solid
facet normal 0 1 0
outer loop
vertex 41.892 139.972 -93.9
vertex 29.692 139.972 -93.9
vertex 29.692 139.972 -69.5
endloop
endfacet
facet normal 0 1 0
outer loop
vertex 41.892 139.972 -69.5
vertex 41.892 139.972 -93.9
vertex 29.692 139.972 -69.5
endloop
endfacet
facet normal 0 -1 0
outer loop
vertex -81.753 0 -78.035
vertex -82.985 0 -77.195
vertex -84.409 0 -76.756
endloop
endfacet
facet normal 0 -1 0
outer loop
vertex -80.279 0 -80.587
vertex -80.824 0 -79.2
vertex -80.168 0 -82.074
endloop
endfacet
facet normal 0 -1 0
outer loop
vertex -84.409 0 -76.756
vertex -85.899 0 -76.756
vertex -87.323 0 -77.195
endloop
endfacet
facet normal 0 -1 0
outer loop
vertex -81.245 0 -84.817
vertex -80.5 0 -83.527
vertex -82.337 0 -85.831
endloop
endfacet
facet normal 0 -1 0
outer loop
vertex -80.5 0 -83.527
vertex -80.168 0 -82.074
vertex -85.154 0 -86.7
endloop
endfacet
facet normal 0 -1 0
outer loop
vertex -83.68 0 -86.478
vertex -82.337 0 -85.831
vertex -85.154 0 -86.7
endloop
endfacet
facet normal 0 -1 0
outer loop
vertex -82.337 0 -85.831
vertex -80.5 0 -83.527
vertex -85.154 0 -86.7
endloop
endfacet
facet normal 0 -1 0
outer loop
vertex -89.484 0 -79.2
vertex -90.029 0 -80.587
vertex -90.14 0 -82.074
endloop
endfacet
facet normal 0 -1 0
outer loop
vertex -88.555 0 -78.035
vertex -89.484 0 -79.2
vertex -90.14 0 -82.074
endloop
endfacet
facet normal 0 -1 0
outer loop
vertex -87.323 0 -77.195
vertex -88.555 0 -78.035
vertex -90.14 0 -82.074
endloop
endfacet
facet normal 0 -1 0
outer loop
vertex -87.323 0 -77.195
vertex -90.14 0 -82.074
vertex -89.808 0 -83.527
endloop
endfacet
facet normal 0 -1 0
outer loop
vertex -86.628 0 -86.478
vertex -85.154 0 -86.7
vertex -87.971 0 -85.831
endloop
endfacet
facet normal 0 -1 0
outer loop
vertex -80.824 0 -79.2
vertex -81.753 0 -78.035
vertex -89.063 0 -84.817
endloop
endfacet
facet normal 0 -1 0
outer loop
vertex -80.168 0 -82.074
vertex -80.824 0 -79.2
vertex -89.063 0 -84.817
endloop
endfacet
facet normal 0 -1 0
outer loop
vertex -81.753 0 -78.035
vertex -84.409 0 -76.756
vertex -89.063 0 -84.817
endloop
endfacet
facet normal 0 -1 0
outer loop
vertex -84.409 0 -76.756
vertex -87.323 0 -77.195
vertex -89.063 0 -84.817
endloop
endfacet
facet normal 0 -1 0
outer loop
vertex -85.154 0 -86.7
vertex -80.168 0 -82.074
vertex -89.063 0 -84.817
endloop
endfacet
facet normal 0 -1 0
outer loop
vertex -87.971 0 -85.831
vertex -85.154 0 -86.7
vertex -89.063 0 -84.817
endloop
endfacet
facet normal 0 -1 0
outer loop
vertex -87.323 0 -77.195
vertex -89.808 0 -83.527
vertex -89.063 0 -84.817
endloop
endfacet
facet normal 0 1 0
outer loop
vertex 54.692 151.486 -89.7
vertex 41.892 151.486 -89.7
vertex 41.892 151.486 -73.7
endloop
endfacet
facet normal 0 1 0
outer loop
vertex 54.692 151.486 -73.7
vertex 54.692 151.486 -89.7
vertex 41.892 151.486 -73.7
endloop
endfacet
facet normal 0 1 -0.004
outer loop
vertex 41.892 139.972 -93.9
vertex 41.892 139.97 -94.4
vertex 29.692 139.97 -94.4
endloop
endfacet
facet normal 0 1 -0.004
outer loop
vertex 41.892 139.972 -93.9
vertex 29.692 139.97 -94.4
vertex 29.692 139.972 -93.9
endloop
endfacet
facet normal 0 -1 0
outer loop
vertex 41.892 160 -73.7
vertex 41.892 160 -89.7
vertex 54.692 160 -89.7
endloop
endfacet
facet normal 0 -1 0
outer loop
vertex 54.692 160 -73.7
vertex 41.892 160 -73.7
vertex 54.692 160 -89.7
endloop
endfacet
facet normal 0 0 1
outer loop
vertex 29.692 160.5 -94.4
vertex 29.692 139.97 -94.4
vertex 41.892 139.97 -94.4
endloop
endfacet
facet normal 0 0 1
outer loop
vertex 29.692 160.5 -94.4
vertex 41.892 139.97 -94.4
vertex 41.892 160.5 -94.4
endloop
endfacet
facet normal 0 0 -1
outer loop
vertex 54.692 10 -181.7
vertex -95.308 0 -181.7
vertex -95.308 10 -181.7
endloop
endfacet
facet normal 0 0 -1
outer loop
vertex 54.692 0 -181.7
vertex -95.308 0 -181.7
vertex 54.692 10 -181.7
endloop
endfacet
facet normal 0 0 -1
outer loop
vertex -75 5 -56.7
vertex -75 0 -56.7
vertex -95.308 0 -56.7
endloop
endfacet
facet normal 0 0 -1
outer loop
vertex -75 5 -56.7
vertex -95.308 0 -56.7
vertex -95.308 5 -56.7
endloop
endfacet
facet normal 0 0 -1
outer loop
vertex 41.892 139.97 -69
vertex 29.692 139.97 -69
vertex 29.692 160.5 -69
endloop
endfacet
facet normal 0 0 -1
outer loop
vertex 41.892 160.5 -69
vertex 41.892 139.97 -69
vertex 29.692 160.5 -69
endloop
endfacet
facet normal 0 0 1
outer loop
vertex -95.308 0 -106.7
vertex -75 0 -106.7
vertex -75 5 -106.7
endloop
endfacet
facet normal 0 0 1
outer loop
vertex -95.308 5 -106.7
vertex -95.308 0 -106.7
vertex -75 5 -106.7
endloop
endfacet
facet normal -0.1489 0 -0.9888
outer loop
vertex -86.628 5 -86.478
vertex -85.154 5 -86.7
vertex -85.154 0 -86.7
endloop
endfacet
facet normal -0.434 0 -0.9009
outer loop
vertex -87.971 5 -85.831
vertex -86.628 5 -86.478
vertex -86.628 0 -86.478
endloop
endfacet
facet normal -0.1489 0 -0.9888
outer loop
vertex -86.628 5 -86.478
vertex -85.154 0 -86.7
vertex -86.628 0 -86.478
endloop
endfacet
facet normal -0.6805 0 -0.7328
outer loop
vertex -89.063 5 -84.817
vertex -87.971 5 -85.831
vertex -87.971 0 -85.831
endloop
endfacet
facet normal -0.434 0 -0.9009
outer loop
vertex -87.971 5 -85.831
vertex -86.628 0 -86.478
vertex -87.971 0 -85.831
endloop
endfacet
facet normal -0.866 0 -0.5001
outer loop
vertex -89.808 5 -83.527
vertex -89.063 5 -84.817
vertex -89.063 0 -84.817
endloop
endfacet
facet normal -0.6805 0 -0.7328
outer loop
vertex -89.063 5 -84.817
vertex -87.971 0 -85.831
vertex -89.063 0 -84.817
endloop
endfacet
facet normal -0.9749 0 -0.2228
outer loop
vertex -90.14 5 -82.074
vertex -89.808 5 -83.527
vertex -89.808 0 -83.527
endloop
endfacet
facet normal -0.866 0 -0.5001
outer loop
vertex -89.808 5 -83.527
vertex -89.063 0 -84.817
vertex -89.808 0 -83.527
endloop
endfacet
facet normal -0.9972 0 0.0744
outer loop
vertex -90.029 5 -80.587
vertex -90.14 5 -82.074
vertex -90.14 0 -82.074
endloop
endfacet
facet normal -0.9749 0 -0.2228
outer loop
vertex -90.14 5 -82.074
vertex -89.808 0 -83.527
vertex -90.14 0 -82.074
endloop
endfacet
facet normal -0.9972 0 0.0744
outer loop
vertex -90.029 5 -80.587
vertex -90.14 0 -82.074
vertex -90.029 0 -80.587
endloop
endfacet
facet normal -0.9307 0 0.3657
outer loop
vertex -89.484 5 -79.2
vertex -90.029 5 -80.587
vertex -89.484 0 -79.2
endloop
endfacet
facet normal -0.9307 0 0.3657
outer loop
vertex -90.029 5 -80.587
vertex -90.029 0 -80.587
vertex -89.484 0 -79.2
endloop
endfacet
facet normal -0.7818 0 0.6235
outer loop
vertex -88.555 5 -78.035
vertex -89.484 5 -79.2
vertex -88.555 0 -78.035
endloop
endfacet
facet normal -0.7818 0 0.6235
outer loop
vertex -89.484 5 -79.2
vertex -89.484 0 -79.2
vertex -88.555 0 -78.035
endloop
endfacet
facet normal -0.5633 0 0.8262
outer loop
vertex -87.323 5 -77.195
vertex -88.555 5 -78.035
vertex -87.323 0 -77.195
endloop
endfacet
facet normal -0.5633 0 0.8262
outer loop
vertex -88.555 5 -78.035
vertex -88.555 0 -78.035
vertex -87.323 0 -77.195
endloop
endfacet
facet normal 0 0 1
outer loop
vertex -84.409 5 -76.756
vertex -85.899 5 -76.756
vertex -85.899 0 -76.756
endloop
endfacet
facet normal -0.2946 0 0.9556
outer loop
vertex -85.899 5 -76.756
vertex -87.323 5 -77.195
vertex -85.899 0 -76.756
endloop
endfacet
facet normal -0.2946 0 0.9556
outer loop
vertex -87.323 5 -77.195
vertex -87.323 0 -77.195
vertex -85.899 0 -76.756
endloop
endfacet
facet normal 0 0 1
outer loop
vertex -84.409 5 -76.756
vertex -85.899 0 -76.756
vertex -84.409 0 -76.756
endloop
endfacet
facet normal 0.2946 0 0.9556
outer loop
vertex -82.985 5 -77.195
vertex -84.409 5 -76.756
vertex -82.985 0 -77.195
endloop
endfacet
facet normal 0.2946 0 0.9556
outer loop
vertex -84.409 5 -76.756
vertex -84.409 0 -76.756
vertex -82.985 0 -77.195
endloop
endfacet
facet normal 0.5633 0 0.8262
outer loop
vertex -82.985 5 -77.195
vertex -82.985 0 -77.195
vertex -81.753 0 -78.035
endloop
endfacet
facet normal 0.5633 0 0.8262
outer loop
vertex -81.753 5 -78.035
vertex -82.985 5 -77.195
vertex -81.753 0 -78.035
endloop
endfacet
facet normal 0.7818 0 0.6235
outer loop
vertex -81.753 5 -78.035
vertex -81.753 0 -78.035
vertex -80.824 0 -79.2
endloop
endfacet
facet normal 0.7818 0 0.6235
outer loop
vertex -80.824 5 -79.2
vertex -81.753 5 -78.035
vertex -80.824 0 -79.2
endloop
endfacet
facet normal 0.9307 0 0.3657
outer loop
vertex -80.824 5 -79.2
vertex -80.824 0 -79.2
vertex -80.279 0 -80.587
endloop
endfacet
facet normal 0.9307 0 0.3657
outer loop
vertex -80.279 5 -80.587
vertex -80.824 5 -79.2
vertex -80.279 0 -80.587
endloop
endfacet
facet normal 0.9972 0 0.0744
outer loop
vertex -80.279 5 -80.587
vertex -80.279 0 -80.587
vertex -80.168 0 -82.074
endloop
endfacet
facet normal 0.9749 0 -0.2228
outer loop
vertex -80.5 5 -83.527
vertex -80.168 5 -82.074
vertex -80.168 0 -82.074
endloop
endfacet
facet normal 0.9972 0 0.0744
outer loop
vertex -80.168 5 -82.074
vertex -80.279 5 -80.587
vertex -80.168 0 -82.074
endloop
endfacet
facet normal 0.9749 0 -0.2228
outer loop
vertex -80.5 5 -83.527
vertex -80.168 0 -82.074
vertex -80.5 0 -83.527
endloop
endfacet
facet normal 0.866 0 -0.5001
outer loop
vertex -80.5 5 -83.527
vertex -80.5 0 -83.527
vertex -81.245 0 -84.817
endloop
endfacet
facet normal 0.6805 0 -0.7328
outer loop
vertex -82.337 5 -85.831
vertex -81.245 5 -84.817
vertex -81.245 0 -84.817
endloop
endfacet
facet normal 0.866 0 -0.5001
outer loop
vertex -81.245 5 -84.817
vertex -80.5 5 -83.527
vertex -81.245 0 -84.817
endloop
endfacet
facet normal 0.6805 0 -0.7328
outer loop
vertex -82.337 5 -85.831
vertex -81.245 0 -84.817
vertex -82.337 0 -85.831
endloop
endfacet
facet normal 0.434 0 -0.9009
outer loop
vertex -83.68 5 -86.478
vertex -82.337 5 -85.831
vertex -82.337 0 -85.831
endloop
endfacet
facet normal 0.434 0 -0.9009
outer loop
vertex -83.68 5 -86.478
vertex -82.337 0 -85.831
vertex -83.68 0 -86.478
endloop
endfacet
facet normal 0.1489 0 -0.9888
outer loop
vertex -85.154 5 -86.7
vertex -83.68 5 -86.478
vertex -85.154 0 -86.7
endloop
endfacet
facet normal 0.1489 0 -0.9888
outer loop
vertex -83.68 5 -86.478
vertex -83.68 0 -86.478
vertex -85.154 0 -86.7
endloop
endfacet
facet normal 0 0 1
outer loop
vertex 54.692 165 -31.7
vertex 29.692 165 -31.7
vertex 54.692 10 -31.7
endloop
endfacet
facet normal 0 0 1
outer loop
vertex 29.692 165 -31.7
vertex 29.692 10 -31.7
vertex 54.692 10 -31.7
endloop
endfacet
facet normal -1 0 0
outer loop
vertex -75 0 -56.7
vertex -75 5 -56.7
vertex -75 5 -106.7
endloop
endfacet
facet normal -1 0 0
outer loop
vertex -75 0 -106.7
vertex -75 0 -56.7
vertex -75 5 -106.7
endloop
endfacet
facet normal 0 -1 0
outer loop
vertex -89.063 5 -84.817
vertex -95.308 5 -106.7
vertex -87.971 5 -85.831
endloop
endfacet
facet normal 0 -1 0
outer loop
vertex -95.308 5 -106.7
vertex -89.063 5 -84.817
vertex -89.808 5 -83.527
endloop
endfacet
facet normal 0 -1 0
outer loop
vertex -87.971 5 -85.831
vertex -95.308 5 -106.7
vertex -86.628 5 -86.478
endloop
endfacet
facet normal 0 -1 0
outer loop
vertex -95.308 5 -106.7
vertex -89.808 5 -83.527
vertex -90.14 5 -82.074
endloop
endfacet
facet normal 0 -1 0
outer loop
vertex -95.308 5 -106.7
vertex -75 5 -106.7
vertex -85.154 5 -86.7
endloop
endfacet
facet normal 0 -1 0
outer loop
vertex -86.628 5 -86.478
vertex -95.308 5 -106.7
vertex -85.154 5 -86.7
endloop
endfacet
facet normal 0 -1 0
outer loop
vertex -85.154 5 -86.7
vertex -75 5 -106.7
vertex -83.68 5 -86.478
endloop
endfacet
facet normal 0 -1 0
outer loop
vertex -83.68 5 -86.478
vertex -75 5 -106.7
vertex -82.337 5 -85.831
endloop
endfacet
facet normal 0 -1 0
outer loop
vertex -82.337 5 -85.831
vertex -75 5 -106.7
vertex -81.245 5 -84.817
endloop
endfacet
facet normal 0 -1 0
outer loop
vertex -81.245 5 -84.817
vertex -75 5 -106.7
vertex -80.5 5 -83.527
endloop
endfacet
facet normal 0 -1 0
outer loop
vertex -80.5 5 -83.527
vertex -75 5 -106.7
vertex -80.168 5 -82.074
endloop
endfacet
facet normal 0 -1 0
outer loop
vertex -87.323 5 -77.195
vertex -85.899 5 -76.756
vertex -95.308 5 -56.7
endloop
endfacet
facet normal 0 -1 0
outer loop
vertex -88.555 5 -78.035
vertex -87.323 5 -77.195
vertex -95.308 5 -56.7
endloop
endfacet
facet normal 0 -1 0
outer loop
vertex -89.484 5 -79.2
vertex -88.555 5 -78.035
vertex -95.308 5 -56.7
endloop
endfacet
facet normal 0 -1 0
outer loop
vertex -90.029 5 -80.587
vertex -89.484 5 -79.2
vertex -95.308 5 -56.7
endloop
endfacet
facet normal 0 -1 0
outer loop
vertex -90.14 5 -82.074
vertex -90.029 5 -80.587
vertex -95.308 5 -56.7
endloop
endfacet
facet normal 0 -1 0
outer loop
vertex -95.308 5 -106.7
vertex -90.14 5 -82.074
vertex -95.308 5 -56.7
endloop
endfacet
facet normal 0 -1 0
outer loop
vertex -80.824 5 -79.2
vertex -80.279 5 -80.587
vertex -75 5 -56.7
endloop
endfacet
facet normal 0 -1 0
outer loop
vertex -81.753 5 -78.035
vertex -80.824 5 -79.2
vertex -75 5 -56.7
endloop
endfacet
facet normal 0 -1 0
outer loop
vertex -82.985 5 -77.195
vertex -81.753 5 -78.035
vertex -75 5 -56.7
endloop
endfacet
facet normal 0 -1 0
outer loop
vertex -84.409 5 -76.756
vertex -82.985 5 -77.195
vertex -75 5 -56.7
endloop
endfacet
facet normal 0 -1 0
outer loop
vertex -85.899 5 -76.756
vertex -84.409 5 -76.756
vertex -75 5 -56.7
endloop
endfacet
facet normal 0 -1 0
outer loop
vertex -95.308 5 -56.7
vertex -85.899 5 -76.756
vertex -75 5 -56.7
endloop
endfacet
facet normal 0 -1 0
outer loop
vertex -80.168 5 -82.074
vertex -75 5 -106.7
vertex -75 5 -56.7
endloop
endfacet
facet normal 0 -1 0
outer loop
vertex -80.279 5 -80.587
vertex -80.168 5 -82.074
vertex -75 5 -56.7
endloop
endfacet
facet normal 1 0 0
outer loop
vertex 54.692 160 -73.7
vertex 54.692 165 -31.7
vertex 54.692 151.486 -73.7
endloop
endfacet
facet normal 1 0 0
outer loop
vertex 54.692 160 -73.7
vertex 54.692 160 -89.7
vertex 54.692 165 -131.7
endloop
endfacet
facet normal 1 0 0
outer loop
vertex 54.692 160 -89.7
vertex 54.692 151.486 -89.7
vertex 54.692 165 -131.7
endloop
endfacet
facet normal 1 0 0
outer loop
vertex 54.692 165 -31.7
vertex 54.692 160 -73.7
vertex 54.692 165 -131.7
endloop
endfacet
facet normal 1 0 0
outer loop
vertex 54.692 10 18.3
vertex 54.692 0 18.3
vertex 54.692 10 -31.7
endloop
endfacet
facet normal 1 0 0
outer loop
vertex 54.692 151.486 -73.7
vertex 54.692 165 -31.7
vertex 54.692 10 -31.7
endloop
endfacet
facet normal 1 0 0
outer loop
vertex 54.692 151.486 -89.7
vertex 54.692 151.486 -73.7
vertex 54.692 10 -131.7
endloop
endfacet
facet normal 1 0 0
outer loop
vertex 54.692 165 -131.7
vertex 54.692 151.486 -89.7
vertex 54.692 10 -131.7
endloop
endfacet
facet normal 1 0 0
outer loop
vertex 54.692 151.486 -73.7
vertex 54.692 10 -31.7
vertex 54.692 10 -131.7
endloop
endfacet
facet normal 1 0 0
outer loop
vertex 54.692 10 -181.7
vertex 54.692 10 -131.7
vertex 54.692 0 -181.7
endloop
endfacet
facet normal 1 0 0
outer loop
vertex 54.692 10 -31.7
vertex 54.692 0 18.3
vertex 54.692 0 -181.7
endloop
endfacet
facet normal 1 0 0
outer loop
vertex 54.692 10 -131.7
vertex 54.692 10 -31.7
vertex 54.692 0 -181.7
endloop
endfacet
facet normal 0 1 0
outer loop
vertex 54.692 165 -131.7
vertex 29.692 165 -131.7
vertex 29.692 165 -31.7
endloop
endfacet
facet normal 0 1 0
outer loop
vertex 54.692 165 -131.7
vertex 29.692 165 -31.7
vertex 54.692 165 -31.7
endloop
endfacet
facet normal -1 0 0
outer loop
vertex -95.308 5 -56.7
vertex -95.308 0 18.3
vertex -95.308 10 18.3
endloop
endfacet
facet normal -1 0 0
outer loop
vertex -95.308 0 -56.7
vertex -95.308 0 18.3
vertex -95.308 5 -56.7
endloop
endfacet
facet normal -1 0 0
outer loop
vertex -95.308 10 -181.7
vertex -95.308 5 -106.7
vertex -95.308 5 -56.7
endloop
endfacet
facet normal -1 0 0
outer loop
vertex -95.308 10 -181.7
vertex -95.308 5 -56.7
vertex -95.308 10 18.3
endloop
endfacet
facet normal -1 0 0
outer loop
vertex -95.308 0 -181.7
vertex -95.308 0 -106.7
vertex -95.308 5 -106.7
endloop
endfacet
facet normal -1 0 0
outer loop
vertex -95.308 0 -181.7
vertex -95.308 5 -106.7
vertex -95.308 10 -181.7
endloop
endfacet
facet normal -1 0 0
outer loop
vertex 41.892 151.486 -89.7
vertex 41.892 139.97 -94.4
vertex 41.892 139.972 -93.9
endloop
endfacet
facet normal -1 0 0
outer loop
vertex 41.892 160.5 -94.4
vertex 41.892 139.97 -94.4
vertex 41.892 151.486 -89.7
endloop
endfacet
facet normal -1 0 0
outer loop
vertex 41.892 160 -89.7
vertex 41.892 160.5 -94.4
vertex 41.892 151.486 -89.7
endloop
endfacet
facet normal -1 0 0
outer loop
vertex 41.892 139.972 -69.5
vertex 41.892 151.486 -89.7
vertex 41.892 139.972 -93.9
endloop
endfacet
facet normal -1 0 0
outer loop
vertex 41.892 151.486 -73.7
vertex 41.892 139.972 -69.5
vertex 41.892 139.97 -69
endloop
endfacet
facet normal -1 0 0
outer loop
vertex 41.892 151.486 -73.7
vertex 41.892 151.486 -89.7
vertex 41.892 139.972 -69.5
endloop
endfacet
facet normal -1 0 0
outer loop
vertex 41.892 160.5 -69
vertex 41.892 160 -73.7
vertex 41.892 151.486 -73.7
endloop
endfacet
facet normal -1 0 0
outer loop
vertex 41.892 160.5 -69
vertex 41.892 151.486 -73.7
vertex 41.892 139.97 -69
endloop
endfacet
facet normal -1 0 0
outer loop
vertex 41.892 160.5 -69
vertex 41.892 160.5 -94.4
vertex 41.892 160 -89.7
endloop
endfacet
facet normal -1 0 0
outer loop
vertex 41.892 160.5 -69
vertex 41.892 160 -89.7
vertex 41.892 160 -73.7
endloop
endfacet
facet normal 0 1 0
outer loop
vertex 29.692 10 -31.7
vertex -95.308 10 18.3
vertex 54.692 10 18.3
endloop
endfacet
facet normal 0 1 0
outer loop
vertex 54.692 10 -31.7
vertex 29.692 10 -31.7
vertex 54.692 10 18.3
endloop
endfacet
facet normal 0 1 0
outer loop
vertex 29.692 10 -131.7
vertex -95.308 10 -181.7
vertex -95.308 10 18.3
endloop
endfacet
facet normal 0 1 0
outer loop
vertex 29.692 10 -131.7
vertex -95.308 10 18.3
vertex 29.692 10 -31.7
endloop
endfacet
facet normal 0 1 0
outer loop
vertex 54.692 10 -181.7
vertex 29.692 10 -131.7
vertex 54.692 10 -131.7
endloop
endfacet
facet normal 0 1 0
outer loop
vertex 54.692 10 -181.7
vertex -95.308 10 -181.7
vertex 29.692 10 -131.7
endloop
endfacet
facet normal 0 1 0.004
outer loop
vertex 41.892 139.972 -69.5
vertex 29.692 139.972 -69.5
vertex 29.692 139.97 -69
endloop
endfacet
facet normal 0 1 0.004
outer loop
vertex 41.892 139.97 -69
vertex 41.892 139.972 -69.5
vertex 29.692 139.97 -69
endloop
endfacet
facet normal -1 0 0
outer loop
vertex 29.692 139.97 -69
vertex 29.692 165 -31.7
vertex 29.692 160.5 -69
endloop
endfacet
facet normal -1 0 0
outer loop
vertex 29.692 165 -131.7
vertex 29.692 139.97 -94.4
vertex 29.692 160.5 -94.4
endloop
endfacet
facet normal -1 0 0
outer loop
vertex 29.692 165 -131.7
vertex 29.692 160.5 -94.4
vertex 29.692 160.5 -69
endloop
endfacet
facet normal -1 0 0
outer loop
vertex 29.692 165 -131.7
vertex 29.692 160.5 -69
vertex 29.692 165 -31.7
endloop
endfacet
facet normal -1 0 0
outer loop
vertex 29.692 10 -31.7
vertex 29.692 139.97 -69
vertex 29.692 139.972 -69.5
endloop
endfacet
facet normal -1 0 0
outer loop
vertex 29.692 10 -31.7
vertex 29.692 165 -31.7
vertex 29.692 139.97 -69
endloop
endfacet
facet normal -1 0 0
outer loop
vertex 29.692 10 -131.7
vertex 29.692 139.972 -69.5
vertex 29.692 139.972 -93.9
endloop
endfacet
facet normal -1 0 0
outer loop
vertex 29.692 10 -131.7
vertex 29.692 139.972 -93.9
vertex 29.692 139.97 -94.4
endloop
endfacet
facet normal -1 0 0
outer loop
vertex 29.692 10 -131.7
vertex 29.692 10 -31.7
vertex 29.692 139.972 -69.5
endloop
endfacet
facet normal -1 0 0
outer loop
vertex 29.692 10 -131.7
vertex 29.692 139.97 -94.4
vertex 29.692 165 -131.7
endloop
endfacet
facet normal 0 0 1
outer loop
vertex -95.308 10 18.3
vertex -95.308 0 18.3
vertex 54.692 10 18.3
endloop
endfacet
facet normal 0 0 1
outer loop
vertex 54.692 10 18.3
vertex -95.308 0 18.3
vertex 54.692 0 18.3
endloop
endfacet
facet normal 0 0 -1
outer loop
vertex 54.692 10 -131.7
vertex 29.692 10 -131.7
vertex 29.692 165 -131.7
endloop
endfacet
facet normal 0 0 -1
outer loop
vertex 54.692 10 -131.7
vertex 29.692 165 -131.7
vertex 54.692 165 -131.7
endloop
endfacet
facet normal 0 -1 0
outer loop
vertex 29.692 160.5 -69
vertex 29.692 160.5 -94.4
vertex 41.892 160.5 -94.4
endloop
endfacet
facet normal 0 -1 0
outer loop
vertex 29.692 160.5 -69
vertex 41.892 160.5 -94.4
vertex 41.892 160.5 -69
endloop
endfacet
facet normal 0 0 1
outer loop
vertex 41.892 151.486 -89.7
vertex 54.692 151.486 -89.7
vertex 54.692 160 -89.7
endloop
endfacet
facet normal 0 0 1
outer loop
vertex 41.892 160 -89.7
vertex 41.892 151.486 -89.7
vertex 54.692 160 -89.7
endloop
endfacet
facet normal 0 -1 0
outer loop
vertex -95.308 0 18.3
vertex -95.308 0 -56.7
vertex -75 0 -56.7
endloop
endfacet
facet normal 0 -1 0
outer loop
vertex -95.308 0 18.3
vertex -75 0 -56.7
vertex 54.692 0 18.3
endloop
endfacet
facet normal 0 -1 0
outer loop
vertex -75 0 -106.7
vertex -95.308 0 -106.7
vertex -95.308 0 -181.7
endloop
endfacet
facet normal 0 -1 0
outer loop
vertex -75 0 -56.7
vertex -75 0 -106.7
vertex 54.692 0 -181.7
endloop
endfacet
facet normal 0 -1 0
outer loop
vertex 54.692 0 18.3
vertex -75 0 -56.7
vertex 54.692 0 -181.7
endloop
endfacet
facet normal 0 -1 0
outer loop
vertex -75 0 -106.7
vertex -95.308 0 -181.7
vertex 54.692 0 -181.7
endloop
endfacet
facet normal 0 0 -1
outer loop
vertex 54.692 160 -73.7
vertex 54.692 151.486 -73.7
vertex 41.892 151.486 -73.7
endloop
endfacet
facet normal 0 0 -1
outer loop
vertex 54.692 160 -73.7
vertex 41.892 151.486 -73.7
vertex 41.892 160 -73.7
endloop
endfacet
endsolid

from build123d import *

# Parameters (mm, degrees)
ESQUISSE2_W             = 150
ESQUISSE2_H             = 200
BOSS_EXTRU_6_DEPTH      = 10
ESQUISSE4_W             = 25
ESQUISSE4_H             = 100
BOSS_EXTRU_7_DEPTH      = 160
ESQUISSE8_W             = 24.4
ESQUISSE8_H             = 20.028297961
ENL_V_MAT_EXTRU_1_DEPTH = 12.2
ESQUISSE9_W             = 12
ESQUISSE9_H             = 5
ENL_V_MAT_EXTRU_2_DEPTH = 42.2
ESQUISSE11_W            = 16
ESQUISSE11_H            = 8.51414898
ENL_V_MAT_EXTRU_3_DEPTH = 42.2
ENL_V_MAT_EXTRU_6_DEPTH = 12.2
ESQUISSE13_W            = 25
ESQUISSE13_H            = 100
BOSS_EXTRU_8_DEPTH      = 5
ESQUISSE14_W            = 25.4
ESQUISSE14_H            = 0.5
ENL_V_MAT_EXTRU_7_DEPTH = 12.2
ESQUISSE19_W            = 50
ESQUISSE19_H            = 5
ENL_V_MAT_EXTRU_8_DEPTH = 150
BOSS_EXTRU_9_DEPTH      = 42
BOSS_EXTRU_9_DEPTH_BACK = 75
ESQUISSE21_W            = 50
ESQUISSE21_H            = 5
ESQUISSE22_R            = 5
BOSS_EXTRU_10_DEPTH     = 6


with BuildPart() as part:
    # Esquisse2 → Boss.-Extru.6 (new body)
    with BuildSketch(Plane(origin=(0, 0, 0), x_dir=(1, 0, 0), z_dir=(0, 1, 0))):
        with Locations((-20.308131119, 81.7)):
            Rectangle(ESQUISSE2_W, ESQUISSE2_H)
    extrude(amount=BOSS_EXTRU_6_DEPTH)

    # Esquisse4 → Boss.-Extru.7 (add)
    with BuildSketch(Plane(origin=(0, 0, 0), x_dir=(1, 0, 0), z_dir=(0, 1, 0))):
        with Locations((42.191868881, 81.7)):
            Rectangle(ESQUISSE4_W, ESQUISSE4_H)
    extrude(amount=BOSS_EXTRU_7_DEPTH)

    # Esquisse8 → Enlèv. mat.-Extru.1 (cut)
    with BuildSketch(Plane.ZY.offset(-29.691868881)):
        with Locations((-81.7, 149.985851019)):
            Rectangle(ESQUISSE8_W, ESQUISSE8_H)
    extrude(amount=-ENL_V_MAT_EXTRU_1_DEPTH, mode=Mode.SUBTRACT)

    # Esquisse9 → Enlèv. mat.-Extru.2 (cut)
    with BuildSketch(Plane.ZY.offset(-41.891868881)):
        with Locations((-81.7, 155.98585102)):
            Rectangle(ESQUISSE9_W, ESQUISSE9_H)
    extrude(amount=-ENL_V_MAT_EXTRU_2_DEPTH, mode=Mode.SUBTRACT)

    # Esquisse11 → Enlèv. mat.-Extru.3 (cut)
    with BuildSketch(Plane.ZY.offset(-41.891868881)):
        with Locations((-81.7, 155.74292551)):
            Rectangle(ESQUISSE11_W, ESQUISSE11_H)
    extrude(amount=-ENL_V_MAT_EXTRU_3_DEPTH, mode=Mode.SUBTRACT)

    # Esquisse12 → Enlèv. mat.-Extru.6 (cut)
    with BuildSketch(Plane.ZY.offset(-29.691868881)):
        Polygon((-94.4, 160), (-94.4, 139.97), (-93.9, 139.971702039), (-93.9, 160), align=None)
        Polygon((-69, 139.97), (-69, 160), (-69.5, 160), (-69.5, 139.971702039), align=None)
    extrude(amount=-ENL_V_MAT_EXTRU_6_DEPTH, mode=Mode.SUBTRACT)

    # Esquisse13 → Boss.-Extru.8 (add)
    with BuildSketch(Plane(origin=(0, 160, 0), x_dir=(1, 0, 0), z_dir=(0, 1, 0))):
        with Locations((42.191868881, 81.7)):
            Rectangle(ESQUISSE13_W, ESQUISSE13_H)
    extrude(amount=BOSS_EXTRU_8_DEPTH)

    # Esquisse14 → Enlèv. mat.-Extru.7 (cut)
    with BuildSketch(Plane.ZY.offset(-29.691868881)):
        with Locations((-81.7, 160.25)):
            Rectangle(ESQUISSE14_W, ESQUISSE14_H)
    extrude(amount=-ENL_V_MAT_EXTRU_7_DEPTH, mode=Mode.SUBTRACT)

    # Esquisse19 → Enlèv. mat.-Extru.8 (cut)
    with BuildSketch(Plane.ZY.offset(-41.891868881)):
        with Locations((-81.7, 2.5)):
            Rectangle(ESQUISSE19_W, ESQUISSE19_H)
    extrude(amount=ENL_V_MAT_EXTRU_8_DEPTH, mode=Mode.SUBTRACT)

    # Esquisse21 → Boss.-Extru.9 (add, two sides: drawn at the far end of the back side and taken through both)
    with BuildSketch(Plane(origin=(0, 0, 0), x_dir=(0, 0, -1), z_dir=(1, 0, 0)).offset(-BOSS_EXTRU_9_DEPTH_BACK)):
        with Locations((81.7, 2.5)):
            Rectangle(ESQUISSE21_W, ESQUISSE21_H)
    extrude(amount=BOSS_EXTRU_9_DEPTH + BOSS_EXTRU_9_DEPTH_BACK)

    # Esquisse22 → Boss.-Extru.10 (add)
    with BuildSketch(Plane(origin=(0, 0, 0), x_dir=(1, 0, 0), z_dir=(0, 1, 0))):
        with Locations(Location((-85.154065559, 81.7, 0), (0, 0, 90))):
            Circle(ESQUISSE22_R)
    extrude(amount=BOSS_EXTRU_10_DEPTH)


solid = part.part
